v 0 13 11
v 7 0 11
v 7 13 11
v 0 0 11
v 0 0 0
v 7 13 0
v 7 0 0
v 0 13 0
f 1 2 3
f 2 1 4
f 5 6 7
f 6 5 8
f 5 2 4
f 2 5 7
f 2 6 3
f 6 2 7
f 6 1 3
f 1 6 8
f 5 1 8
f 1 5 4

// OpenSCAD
// Generated by SolidPython 1.0.1 on 2020-07-29 00:46:55


cube(size = [7, 13, 11]);
/***********************************************
*********      SolidPython code:      **********
************************************************
 
# import packages: SolidPython
from solid import *
from solid.utils import *
from itertools import chain, combinations, permutations


class Resize:

    def __init__(self, scad_file):
        self.scad_file = scad_file
        #self.scad_file = import_scad(scad_file)
        # cone/cylinder param:
        self.r1 = 0
        self.r2 = 0
        self.h = 0
        # rectangular prism param:
        self.w = 0
        self.l = 0
        # ellipse param:
        self.r = 0

    # import OpenScad code (file name corresponds to shape)


    # classify shape + parameters
    def assign(self, param1, param2, param3):
        if self.scad_file == 'cone.scad':
            self.r1 = param1
            self.r2 = param2
            self.h = param3
        elif self.scad_file == 'cylinder.scad':
            self.r1 = param1
            self.r2 = param2
            self.h = param3
        elif self.scad_file == 'rectangularPrism.scad':
            self.h = param1
            self.l = param2
            self.w = param3
        else:
            self.r = param1
            self.h = param2

    # resize parameters
    def iterate(self):
        x = range(3, 20, 2)
        i = 1
        if self.scad_file == 'cone.scad':
            tempList = list(permutations(x, 2))
            for temp in tempList:
                param1 = temp[0]
                param2 = temp[1]
                filepath = 'produced_scad_files/' + 'cone' + str(param1) + '_' + str(param2) + '_' + '.scad'
                scad_render_to_file(cylinder(h=param1, r1=param2, r2=0), filepath)

        elif self.scad_file == 'cylinder.scad':
            tempList = list(permutations(x, 3))
            for temp in tempList:
                param1 = temp[0]
                param2 = temp[1]
                filepath = 'produced_scad_files/' + 'cylinder' + str(param1) + '_' + str(param2) + '_' + '.scad'
                scad_render_to_file(cylinder(h=param1, r1=param2, r2=param2), filepath)

        elif self.scad_file == 'rectangularPrism.scad':
            tempList = list(permutations(x, 3))
            for temp in tempList:
                param1 = temp[0]
                param2 = temp[1]
                param3 = temp[2]
                filepath = 'produced_scad_files/' + 'rectangularPrism' + str(param1) + '_' + str(param2) + '_' + str(
                    param3) + '.scad'
                scad_render_to_file(cube(size=(param1, param2, param3)), filepath)

        elif self.scad_file == 'ellipse.scad':
            tempList = list(permutations(x, 4))
            for temp in tempList:
                param1 = temp[0]
                param2 = temp[1]
                param3 = temp[2]
                param4 = temp[3]
                filepath = 'produced_scad_files/' + 'ellipse' + str(param1) + '_' + str(param2) + '_' + str(param3) + '_' + str(param4) + '.scad'
                scad_render_to_file(scale([param1, param2, param3])(sphere(r=param4)), filepath)

    def render_to_scadfile(self):
        scad_render_to_file(scad, 'example.scad') 
 
************************************************/
